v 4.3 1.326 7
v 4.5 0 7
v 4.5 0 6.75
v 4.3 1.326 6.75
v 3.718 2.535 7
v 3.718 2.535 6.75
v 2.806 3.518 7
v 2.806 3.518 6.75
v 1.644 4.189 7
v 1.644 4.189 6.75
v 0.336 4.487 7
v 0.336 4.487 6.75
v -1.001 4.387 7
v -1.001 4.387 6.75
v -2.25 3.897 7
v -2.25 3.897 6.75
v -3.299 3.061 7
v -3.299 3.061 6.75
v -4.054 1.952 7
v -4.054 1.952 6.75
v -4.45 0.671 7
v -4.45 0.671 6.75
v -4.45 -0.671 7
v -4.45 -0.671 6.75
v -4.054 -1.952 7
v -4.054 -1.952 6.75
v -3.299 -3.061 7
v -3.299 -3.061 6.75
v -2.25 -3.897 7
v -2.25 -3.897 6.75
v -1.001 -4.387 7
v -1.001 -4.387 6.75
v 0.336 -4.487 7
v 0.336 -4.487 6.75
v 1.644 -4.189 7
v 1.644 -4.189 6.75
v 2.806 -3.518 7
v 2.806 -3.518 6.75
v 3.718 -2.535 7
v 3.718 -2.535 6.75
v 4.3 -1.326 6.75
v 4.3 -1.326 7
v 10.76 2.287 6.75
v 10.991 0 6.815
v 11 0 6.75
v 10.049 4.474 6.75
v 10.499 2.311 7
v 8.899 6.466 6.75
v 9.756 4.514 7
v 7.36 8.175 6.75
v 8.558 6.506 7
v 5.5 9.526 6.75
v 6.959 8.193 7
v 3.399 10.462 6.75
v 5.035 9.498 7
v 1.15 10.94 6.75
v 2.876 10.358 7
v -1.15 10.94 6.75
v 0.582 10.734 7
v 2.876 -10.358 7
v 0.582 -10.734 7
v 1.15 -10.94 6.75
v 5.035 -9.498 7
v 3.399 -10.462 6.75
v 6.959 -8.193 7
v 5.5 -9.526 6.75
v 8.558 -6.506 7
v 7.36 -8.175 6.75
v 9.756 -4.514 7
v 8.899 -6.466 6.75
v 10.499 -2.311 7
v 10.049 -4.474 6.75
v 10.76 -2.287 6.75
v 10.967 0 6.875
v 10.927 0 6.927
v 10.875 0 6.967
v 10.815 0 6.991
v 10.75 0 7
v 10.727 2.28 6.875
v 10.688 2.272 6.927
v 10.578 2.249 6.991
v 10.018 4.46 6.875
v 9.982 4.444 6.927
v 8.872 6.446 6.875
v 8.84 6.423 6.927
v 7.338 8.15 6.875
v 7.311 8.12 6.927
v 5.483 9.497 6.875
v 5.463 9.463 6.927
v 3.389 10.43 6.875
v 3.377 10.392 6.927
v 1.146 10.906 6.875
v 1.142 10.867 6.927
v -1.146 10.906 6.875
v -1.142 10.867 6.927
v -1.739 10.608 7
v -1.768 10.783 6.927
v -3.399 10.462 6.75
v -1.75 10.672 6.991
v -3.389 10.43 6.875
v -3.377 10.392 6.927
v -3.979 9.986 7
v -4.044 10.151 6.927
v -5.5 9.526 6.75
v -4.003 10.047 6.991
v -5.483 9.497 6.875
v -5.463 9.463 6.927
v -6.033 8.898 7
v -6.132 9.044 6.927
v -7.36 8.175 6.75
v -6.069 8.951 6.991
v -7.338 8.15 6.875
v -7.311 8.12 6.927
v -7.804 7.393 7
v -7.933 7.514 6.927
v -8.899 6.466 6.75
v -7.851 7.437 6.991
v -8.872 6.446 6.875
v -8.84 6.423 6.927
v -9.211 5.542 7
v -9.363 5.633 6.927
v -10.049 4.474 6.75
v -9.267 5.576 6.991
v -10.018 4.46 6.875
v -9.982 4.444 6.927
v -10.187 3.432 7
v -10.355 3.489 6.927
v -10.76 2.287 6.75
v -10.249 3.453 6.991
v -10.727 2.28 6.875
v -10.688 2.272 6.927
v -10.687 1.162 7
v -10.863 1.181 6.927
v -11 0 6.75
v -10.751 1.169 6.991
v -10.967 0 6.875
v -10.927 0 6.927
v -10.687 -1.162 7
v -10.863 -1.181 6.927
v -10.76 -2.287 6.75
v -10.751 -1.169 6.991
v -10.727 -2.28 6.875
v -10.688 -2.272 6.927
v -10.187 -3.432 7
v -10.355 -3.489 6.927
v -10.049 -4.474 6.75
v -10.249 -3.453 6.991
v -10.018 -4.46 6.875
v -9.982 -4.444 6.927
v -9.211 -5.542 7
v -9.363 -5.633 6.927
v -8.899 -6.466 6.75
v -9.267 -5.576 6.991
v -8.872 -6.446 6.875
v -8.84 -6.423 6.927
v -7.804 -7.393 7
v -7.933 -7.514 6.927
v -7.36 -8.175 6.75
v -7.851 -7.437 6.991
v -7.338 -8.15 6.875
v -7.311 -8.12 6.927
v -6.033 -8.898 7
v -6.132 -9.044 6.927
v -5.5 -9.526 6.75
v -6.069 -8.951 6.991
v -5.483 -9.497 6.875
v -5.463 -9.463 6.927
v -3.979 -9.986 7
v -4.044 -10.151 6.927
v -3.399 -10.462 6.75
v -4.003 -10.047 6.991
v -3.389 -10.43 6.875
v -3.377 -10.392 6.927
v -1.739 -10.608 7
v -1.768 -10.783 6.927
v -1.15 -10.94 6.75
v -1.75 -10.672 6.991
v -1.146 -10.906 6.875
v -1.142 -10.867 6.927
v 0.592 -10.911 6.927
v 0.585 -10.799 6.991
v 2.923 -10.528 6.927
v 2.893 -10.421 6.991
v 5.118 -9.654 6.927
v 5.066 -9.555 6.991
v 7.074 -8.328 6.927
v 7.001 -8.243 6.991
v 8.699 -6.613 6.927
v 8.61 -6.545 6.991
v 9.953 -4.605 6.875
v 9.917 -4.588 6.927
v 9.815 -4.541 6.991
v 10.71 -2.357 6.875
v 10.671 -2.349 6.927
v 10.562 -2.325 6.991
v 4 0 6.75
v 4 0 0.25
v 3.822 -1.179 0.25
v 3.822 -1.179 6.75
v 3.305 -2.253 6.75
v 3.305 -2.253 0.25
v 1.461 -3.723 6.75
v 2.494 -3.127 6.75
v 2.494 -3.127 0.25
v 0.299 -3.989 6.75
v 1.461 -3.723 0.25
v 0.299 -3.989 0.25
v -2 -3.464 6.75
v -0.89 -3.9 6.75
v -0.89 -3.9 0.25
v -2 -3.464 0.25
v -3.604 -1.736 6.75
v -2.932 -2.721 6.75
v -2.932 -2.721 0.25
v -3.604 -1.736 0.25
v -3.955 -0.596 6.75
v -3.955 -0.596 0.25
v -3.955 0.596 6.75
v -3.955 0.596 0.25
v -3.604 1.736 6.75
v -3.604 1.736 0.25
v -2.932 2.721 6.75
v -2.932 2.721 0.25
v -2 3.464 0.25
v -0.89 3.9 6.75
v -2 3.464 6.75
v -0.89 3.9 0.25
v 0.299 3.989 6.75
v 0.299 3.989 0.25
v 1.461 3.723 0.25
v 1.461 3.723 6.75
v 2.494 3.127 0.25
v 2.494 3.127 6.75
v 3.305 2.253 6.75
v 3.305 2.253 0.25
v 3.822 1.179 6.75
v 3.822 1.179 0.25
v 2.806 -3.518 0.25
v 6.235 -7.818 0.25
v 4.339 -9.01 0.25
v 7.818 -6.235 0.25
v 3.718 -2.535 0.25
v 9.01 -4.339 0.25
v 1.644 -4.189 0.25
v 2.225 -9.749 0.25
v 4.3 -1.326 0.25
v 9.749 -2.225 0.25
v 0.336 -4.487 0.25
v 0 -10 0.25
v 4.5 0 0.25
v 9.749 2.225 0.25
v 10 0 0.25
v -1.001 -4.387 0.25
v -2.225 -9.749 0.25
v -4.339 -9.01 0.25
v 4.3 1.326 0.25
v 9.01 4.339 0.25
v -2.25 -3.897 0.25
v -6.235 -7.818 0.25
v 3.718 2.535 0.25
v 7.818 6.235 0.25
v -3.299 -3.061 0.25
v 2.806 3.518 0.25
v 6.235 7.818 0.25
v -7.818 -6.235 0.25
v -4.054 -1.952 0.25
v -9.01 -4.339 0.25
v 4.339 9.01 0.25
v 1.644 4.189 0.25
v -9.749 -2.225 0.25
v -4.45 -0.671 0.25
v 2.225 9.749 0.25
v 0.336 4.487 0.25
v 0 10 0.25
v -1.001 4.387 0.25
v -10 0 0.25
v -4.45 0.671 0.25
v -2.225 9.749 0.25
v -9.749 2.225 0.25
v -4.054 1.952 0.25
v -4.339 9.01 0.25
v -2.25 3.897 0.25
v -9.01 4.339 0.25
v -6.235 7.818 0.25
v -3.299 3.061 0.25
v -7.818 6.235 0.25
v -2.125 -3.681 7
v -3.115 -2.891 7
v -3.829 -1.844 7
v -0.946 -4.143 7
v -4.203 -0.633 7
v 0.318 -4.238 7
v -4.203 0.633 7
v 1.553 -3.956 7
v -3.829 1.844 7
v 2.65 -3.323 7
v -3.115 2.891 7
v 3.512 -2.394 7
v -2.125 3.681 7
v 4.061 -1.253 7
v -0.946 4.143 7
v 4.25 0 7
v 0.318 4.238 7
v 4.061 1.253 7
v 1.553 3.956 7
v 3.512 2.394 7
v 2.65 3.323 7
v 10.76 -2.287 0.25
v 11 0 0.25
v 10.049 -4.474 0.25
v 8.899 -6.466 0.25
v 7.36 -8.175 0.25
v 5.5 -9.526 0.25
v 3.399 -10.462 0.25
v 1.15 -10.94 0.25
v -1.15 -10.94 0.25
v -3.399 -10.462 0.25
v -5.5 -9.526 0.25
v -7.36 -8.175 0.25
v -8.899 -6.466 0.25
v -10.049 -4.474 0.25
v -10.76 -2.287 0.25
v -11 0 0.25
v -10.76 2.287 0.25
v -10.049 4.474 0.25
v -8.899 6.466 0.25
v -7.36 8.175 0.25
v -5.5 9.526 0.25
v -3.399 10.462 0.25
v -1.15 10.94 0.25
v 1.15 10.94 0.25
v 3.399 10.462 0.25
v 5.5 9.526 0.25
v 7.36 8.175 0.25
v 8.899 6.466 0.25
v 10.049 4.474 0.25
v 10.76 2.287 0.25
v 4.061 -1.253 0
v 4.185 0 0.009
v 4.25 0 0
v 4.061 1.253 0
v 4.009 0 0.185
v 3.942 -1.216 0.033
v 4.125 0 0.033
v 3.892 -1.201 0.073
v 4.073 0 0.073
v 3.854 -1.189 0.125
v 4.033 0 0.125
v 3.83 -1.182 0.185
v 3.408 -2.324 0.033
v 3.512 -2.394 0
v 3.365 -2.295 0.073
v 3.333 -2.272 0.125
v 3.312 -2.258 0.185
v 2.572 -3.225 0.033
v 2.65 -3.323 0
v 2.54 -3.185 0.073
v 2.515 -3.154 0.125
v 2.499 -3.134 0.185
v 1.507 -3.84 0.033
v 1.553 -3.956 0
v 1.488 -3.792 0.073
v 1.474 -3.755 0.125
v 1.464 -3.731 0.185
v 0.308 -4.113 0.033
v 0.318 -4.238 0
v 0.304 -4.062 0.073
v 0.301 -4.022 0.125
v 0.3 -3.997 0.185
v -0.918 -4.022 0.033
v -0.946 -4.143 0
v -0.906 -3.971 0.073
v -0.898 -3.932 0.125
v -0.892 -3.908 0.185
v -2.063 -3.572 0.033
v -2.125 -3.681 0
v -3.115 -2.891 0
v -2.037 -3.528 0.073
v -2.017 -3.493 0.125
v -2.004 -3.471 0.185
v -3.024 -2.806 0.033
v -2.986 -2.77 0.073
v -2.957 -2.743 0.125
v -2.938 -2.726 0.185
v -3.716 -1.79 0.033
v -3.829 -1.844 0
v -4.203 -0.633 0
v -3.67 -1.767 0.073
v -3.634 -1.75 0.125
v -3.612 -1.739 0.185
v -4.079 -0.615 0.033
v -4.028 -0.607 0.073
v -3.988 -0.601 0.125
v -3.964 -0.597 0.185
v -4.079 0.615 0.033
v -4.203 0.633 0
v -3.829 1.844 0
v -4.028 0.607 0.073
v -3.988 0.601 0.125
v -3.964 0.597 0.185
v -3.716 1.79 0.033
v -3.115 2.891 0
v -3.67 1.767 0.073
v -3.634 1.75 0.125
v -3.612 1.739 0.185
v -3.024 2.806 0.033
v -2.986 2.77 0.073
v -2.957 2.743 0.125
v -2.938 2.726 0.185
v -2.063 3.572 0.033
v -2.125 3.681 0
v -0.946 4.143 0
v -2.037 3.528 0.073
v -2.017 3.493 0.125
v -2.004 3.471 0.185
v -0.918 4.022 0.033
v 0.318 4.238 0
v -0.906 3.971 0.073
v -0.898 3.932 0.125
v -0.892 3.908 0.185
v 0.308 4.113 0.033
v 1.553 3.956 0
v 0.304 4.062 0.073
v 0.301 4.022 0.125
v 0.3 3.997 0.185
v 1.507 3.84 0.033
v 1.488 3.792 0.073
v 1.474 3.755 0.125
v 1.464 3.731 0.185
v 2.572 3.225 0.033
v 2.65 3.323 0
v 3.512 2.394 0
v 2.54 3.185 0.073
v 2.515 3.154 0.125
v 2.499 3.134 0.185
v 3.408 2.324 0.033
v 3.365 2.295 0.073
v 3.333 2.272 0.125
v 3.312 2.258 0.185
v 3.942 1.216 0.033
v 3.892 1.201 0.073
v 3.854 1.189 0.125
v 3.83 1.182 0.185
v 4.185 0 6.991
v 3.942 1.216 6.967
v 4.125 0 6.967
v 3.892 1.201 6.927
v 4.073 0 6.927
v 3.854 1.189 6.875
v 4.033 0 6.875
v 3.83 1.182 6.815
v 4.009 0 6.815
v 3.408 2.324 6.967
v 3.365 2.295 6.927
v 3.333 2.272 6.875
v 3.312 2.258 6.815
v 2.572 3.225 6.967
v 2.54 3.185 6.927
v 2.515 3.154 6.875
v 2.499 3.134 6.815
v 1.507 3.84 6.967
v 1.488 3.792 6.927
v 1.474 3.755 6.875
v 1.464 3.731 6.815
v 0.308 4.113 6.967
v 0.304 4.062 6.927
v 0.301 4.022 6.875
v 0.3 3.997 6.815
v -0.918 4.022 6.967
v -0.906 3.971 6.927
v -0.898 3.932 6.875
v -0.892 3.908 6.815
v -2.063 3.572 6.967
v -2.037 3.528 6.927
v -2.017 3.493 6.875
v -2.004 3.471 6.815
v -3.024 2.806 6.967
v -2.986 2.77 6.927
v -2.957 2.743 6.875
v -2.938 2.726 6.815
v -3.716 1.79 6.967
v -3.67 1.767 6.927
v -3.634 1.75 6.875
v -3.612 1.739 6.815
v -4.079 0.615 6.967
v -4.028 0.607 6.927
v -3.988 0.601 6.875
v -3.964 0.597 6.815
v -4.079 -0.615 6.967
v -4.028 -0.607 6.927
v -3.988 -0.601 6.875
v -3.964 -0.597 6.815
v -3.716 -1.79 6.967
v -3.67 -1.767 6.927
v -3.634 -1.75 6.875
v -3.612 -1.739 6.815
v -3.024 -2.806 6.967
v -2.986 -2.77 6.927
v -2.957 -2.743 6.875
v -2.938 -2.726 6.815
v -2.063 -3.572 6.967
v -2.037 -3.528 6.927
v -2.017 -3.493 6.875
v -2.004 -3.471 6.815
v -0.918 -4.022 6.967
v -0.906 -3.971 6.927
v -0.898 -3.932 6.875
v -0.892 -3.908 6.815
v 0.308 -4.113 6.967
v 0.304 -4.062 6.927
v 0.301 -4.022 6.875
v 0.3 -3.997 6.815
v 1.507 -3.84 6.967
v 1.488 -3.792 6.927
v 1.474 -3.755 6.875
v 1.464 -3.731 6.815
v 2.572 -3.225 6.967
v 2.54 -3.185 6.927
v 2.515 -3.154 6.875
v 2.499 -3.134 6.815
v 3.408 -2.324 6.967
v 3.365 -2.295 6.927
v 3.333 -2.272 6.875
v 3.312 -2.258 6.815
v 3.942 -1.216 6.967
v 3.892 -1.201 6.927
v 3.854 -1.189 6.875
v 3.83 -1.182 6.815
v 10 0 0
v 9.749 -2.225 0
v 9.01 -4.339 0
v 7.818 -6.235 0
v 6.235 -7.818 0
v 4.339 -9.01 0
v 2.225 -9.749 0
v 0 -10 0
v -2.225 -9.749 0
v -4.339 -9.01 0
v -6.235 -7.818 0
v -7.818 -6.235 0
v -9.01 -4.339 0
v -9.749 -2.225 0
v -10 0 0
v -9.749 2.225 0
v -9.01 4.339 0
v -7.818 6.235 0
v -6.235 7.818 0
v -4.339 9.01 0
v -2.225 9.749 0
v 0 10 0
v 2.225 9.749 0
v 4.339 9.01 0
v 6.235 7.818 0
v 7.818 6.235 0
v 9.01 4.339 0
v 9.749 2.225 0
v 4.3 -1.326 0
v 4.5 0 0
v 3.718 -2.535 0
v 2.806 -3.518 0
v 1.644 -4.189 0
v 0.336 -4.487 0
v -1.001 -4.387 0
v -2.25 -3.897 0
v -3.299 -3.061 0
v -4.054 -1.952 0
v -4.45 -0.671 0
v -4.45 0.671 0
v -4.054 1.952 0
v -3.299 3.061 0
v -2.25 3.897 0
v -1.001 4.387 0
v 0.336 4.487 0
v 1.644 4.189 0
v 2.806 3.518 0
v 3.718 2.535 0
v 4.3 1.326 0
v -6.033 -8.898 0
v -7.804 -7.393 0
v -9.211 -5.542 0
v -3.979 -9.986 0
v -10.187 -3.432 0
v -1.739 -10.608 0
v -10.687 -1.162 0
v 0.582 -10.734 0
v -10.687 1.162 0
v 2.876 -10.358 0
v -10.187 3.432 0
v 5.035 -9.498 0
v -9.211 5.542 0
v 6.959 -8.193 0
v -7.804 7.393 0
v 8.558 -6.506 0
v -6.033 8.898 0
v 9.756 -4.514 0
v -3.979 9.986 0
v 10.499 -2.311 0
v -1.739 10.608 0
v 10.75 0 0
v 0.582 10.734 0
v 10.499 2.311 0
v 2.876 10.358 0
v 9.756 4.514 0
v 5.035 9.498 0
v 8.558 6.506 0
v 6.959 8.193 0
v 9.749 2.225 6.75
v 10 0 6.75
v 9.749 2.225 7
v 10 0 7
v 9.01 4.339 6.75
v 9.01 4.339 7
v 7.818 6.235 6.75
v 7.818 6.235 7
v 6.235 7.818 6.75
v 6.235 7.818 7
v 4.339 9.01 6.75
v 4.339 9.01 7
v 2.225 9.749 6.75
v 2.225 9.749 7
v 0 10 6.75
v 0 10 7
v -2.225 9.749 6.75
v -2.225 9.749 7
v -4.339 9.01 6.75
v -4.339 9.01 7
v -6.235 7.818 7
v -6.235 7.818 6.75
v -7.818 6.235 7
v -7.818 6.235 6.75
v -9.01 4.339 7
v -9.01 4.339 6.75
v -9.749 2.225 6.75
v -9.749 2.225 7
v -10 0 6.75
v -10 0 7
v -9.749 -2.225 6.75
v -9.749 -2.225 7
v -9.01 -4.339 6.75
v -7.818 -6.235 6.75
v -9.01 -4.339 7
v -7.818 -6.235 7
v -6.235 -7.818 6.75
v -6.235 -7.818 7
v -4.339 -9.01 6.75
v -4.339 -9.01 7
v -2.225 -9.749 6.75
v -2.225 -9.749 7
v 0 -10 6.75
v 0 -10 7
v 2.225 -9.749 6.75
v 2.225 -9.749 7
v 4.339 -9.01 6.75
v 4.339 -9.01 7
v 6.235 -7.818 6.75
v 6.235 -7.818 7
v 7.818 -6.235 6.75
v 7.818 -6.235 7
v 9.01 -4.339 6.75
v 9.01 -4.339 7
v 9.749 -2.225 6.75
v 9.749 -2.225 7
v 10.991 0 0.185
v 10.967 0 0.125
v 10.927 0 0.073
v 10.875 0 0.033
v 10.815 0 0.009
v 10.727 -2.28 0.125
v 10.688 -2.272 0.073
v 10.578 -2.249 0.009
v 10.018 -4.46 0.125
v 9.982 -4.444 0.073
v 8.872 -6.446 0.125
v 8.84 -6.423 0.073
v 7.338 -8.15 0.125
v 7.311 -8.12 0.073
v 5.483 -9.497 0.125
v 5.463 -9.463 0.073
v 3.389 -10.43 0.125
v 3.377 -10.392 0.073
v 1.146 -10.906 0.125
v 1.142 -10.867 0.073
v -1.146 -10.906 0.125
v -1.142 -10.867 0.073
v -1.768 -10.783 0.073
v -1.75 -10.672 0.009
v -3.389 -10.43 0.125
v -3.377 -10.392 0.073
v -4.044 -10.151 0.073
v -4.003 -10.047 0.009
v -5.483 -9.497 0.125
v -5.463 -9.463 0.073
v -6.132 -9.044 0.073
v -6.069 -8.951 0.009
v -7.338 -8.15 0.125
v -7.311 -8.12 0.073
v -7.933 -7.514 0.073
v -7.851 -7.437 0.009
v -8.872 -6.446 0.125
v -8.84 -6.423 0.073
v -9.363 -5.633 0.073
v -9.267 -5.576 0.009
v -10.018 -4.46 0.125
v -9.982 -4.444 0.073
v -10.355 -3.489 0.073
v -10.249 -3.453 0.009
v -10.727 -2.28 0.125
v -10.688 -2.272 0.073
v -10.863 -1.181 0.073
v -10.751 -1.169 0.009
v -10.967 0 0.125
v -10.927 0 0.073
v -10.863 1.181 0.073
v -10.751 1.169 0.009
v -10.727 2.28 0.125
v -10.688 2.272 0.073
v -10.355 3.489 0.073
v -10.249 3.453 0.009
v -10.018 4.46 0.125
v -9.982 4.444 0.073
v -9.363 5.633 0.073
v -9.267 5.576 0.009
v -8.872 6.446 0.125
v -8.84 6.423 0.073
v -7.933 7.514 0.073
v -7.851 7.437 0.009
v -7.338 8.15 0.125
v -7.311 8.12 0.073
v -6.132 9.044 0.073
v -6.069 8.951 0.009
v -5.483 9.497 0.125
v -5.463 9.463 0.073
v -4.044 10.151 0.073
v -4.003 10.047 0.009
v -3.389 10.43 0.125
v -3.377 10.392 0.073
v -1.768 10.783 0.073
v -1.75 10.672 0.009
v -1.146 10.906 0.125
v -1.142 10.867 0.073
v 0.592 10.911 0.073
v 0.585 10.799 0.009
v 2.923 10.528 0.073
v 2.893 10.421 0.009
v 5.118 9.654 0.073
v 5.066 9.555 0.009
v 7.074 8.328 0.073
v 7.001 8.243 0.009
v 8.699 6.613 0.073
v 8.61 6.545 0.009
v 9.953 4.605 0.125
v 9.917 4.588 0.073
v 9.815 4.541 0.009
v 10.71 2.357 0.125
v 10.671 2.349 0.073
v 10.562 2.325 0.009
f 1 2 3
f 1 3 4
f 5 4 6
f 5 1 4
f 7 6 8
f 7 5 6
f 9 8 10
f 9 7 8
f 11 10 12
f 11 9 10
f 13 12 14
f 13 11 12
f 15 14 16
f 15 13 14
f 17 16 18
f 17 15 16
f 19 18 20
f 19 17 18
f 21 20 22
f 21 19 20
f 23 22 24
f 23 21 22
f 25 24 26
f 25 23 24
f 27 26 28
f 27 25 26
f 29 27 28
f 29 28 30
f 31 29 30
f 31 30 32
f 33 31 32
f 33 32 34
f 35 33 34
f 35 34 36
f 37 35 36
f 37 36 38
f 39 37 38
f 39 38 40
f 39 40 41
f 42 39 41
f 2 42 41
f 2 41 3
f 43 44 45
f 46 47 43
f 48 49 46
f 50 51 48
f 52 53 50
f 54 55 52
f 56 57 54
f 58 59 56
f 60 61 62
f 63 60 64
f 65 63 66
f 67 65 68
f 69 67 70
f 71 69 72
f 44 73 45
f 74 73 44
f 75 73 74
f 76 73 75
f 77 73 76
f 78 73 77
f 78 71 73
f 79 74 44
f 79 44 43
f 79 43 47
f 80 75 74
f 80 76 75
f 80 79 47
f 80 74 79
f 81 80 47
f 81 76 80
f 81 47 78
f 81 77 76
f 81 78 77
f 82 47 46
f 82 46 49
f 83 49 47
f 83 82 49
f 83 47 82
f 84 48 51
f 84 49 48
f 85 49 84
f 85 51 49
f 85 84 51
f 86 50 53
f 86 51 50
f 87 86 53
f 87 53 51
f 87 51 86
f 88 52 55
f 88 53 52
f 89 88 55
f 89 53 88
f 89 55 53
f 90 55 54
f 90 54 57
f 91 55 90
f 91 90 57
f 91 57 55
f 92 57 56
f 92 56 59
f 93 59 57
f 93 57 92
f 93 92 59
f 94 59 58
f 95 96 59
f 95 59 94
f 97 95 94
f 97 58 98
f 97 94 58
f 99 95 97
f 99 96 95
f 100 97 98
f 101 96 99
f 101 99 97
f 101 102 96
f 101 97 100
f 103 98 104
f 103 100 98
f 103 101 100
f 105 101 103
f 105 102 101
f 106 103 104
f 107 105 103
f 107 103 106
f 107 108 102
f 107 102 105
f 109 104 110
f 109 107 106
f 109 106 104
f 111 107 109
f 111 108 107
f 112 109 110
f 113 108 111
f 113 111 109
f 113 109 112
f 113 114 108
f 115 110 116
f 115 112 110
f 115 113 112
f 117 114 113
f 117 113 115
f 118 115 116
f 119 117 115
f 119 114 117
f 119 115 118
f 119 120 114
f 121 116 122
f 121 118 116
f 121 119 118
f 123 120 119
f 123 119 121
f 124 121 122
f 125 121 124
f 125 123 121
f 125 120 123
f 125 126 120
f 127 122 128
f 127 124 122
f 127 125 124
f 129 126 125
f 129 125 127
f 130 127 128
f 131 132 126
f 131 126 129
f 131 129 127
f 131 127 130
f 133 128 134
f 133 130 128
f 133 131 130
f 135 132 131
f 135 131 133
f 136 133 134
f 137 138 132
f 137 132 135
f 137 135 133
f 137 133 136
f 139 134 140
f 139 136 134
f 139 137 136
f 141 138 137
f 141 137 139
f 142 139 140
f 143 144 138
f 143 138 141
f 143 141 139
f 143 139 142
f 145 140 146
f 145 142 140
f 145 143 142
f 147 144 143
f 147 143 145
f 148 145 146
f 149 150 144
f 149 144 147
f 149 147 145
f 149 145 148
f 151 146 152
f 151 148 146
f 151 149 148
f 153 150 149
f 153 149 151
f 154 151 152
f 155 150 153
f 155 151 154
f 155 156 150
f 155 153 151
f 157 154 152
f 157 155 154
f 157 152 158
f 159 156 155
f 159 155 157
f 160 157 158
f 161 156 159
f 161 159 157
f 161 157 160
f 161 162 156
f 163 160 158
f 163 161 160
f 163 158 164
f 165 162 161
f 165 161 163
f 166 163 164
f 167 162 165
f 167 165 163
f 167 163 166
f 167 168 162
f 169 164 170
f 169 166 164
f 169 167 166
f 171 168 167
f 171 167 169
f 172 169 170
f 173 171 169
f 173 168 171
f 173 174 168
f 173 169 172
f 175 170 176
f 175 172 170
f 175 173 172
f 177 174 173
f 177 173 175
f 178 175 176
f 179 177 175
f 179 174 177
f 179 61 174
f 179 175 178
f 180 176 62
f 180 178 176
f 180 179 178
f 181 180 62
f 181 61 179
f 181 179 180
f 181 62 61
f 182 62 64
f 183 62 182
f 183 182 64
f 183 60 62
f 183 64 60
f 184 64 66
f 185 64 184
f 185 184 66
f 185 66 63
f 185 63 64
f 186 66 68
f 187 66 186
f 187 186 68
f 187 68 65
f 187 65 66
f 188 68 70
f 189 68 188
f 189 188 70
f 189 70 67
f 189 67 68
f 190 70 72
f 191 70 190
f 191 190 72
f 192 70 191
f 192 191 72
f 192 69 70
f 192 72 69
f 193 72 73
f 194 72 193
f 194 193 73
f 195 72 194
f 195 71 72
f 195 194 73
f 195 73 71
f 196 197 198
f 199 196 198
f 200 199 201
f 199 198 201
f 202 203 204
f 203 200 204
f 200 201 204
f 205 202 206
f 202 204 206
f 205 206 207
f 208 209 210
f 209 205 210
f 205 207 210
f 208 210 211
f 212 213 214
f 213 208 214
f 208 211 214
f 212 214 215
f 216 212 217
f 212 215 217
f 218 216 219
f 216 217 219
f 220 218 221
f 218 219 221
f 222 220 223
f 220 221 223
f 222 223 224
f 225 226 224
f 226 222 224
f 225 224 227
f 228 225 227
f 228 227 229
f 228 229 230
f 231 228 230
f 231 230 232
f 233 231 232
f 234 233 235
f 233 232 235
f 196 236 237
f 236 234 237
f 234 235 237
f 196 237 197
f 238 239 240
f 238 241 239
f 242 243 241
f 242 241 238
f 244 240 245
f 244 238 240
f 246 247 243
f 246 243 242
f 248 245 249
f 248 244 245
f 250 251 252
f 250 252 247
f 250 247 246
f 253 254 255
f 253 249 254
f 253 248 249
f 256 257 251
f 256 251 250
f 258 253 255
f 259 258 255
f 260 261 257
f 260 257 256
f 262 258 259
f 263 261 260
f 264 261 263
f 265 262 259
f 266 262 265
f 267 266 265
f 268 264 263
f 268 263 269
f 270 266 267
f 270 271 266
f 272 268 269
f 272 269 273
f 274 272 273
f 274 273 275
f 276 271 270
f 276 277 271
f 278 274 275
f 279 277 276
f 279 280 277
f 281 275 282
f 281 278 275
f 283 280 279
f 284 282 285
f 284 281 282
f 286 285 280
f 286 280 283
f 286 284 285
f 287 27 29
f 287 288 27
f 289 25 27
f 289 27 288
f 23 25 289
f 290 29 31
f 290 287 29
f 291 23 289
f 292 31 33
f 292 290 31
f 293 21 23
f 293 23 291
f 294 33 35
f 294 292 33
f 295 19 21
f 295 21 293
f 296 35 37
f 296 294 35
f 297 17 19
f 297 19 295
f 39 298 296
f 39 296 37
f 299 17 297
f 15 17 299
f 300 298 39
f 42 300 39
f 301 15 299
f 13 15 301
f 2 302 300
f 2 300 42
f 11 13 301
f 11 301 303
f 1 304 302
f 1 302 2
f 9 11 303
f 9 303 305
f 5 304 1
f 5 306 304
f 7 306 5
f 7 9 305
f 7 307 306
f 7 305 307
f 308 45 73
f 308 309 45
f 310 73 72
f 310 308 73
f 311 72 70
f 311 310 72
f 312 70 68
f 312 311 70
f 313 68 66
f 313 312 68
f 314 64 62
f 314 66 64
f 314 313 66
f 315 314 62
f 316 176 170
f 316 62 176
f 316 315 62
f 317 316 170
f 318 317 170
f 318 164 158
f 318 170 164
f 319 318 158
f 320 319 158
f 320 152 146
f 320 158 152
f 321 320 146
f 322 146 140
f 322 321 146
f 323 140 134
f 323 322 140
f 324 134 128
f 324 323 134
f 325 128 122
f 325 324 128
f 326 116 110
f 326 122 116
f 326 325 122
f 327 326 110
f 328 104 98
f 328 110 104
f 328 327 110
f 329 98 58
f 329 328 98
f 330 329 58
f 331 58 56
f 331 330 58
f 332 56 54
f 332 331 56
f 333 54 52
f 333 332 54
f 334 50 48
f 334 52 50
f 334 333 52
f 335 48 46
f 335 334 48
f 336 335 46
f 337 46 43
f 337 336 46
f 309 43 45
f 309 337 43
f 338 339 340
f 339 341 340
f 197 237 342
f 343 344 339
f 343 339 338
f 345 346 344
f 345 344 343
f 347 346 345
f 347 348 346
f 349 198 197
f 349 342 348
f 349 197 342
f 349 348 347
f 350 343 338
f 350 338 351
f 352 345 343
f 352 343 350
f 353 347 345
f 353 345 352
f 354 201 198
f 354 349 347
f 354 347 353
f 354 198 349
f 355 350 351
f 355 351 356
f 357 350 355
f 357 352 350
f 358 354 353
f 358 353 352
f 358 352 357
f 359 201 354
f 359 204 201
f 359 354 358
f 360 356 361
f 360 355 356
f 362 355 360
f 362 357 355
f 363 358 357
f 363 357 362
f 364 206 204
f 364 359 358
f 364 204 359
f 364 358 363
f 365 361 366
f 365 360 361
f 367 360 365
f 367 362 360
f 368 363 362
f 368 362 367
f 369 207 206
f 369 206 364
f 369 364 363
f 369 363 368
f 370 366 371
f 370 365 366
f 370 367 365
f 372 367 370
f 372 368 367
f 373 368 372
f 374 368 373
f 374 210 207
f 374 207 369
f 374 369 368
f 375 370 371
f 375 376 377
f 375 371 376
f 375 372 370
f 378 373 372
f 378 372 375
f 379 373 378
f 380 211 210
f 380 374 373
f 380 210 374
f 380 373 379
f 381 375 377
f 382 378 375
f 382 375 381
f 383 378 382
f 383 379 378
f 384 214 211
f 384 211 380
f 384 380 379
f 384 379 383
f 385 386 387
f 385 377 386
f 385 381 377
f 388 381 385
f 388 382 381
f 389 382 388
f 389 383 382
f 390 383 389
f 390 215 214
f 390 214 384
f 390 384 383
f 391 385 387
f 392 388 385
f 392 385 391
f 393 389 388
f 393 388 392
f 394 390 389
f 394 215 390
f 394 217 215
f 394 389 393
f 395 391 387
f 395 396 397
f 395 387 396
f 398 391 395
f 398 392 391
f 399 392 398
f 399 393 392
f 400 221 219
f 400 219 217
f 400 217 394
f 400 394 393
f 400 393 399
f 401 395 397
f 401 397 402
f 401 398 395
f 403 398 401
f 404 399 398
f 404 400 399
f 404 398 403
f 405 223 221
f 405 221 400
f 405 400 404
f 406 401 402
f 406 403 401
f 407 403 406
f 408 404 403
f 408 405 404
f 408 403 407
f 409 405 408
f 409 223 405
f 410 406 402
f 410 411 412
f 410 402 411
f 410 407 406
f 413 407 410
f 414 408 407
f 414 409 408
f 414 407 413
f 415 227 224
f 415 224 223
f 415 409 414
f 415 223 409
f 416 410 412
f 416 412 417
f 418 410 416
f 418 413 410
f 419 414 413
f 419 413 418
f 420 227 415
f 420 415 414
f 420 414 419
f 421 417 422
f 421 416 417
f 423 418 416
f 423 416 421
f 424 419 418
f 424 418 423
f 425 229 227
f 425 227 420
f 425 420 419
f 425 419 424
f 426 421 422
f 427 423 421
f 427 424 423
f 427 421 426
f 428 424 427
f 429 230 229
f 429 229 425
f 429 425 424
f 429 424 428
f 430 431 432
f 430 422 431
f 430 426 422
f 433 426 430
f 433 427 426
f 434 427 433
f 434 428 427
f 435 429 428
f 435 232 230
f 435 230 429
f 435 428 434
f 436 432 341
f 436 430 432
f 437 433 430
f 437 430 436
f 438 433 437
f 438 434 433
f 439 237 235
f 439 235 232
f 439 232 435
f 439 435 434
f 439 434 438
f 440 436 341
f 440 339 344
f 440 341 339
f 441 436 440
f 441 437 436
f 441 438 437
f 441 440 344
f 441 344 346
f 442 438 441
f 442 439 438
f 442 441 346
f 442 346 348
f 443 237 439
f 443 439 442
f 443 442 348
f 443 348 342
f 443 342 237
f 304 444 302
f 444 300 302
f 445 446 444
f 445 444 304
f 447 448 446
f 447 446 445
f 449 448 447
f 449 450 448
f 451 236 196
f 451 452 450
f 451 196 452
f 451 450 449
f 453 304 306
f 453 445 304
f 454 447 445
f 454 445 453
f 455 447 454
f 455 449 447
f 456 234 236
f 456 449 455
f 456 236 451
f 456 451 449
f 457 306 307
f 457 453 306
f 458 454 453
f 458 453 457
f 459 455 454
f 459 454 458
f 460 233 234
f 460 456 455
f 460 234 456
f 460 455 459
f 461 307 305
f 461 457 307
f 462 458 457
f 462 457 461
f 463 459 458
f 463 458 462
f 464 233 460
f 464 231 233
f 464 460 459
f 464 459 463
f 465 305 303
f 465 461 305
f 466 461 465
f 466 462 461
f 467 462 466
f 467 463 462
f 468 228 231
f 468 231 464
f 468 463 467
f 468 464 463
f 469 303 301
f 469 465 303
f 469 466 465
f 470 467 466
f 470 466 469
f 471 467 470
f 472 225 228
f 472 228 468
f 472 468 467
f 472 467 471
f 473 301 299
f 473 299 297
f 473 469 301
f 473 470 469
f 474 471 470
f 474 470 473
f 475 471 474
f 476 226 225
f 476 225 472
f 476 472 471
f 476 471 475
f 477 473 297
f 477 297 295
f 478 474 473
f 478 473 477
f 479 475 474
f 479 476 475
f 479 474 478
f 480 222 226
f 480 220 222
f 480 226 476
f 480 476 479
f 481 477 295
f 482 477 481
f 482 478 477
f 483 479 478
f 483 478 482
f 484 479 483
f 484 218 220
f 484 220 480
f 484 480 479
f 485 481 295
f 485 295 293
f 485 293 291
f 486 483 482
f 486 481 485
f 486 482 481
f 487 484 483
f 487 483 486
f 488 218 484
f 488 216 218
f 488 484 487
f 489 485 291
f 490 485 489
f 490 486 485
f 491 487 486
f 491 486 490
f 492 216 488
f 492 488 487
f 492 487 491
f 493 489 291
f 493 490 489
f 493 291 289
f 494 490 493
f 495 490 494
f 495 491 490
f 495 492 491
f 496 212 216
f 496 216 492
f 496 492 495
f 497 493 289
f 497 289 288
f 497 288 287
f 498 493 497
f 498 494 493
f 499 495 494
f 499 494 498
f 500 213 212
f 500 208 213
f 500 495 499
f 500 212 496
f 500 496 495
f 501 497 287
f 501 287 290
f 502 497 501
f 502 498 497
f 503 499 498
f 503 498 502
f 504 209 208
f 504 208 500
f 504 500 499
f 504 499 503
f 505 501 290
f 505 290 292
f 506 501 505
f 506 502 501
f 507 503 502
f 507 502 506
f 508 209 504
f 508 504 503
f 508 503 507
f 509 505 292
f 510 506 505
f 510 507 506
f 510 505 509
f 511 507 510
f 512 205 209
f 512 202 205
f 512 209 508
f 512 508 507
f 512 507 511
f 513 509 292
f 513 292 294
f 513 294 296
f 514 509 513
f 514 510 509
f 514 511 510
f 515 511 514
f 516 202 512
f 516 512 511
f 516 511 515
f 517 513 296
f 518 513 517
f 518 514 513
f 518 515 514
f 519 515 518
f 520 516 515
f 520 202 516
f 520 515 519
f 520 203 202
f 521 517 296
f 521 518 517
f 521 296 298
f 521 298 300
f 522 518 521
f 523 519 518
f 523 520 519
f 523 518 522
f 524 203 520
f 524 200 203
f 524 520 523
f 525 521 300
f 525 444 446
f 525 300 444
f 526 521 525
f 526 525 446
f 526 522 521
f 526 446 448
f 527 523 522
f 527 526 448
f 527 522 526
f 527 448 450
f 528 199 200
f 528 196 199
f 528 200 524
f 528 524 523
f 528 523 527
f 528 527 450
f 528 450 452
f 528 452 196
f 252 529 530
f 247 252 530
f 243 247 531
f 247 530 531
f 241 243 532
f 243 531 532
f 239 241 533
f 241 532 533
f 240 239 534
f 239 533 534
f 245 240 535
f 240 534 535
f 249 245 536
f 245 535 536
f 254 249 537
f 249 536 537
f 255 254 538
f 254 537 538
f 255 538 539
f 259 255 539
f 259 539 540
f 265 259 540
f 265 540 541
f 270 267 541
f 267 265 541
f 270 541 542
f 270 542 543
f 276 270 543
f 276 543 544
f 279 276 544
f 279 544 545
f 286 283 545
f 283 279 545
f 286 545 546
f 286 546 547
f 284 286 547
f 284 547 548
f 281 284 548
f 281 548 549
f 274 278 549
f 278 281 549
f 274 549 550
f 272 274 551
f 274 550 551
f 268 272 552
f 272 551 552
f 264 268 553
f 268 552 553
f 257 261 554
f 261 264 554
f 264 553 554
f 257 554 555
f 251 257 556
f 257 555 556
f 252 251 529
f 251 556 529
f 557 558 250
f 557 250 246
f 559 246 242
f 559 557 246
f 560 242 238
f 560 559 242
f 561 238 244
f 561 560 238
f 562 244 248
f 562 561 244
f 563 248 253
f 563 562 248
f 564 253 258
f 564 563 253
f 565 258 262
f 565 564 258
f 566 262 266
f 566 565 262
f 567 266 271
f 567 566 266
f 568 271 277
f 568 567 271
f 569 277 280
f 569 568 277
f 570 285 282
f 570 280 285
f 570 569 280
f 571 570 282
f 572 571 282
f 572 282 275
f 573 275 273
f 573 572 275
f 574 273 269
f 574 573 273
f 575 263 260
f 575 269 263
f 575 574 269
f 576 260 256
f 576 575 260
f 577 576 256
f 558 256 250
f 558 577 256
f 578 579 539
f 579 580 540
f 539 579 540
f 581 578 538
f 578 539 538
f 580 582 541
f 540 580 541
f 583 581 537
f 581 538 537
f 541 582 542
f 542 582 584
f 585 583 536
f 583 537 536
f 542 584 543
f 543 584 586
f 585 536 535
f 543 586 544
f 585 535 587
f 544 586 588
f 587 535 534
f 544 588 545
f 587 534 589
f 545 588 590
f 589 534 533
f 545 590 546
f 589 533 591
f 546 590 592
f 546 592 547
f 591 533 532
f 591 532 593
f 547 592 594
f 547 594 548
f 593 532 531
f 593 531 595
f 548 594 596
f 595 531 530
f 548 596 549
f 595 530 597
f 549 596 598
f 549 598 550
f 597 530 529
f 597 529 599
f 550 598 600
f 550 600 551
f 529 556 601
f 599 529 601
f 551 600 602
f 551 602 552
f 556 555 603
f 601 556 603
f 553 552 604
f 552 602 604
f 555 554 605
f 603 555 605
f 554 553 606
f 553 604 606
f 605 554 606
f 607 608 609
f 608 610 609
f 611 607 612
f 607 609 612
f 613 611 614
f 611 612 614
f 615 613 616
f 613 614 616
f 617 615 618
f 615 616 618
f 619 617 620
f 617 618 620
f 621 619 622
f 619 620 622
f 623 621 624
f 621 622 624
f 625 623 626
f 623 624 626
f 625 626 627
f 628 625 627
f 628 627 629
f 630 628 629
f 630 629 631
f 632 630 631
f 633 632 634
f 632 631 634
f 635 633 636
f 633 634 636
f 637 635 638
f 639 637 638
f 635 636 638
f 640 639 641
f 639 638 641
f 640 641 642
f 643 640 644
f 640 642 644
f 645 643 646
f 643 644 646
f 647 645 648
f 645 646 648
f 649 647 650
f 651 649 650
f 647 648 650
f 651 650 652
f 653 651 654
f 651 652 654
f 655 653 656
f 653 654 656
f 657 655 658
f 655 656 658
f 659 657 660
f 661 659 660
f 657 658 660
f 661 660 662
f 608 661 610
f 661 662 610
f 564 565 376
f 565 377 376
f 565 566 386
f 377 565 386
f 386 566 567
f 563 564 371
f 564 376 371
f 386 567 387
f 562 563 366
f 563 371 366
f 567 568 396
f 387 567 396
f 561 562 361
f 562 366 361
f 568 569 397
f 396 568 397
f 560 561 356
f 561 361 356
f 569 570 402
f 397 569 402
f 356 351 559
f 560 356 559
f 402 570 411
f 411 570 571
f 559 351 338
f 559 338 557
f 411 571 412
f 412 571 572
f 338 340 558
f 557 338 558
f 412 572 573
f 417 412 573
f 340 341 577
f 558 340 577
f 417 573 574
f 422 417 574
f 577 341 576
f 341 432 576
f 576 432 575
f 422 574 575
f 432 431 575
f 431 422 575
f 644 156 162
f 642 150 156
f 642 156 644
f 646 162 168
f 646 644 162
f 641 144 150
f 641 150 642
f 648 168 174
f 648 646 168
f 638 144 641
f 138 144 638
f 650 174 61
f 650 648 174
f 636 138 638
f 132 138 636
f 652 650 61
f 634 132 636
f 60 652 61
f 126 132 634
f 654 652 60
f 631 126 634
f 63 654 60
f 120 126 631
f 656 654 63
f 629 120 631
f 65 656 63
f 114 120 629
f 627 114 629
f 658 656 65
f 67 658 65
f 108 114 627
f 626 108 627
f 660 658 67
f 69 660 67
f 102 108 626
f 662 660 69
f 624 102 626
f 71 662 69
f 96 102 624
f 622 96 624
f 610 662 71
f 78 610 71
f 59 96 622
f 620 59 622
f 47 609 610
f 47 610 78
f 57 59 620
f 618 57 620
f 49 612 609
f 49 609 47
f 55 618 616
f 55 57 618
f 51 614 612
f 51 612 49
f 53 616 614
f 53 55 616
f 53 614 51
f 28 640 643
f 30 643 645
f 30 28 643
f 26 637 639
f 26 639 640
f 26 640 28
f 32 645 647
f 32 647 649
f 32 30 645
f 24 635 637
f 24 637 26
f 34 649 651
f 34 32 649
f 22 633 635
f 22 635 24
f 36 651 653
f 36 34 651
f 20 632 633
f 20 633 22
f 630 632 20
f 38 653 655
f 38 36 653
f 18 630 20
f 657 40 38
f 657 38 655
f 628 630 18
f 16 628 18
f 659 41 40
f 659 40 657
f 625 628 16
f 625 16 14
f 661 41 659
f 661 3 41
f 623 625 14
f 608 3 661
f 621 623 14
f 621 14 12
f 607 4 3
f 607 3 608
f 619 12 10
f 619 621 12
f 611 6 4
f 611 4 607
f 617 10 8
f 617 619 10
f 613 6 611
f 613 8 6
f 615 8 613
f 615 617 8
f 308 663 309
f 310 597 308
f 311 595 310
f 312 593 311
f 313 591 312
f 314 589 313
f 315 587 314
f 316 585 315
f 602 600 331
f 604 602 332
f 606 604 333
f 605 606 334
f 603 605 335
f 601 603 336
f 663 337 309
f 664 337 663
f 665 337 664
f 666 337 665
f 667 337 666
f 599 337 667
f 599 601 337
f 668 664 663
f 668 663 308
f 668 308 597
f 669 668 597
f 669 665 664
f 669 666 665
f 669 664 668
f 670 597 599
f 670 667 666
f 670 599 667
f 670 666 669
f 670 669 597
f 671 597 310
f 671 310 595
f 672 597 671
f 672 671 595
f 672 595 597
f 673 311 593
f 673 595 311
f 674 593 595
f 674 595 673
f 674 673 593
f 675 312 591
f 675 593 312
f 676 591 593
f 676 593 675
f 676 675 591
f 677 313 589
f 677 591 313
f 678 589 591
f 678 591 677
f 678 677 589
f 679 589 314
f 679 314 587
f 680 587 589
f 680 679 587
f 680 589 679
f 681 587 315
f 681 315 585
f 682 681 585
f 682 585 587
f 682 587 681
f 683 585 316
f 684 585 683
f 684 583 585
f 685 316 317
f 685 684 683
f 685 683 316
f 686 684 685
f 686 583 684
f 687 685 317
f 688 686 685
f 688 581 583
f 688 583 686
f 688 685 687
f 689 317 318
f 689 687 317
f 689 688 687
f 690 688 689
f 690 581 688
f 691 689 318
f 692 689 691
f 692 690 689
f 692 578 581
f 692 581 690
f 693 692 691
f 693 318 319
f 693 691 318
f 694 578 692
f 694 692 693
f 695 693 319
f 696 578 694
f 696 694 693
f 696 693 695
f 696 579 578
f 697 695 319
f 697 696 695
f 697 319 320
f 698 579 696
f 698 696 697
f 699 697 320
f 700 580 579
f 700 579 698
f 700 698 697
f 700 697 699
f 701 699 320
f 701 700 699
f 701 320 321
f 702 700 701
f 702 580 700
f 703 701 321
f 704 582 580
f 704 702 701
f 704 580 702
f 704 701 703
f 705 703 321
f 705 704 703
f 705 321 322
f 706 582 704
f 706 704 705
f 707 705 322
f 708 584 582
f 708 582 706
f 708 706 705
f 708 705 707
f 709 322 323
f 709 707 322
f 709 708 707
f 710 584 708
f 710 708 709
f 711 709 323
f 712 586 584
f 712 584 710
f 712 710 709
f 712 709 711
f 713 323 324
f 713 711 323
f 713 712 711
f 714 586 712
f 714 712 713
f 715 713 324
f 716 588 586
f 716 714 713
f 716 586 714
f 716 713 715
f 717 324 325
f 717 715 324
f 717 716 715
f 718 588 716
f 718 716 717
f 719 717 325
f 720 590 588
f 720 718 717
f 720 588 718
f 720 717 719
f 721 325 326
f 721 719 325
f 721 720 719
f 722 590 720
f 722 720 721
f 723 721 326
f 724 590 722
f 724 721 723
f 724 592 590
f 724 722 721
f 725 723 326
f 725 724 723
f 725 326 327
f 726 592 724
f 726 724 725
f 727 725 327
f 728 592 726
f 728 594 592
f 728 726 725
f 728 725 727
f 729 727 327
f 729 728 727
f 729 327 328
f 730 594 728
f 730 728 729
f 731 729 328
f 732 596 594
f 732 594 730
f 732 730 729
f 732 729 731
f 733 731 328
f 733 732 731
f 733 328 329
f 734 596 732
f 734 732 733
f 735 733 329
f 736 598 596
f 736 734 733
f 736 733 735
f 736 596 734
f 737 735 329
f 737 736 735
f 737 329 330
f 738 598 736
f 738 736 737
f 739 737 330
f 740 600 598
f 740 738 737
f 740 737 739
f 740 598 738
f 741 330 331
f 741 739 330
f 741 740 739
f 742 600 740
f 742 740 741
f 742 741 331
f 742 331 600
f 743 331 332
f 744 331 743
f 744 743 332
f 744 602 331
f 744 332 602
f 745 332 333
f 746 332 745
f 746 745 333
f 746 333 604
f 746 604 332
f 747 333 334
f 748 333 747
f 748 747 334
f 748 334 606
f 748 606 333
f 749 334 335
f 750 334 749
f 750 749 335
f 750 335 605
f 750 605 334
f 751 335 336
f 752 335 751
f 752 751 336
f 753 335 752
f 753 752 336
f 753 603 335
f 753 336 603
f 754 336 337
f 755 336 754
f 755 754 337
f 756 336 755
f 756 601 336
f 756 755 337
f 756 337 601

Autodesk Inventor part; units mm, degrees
ref_plane "YZ Plane" through (0, 0, 0) normal (1, 0, 0) x (0, 1, 0)
ref_plane "XZ Plane" through (0, 0, 0) normal (0, 1, 0) x (-1, 0, 0)
sketch "Sketch1" plane through (0, 0, 0) normal (0, 0, 1) x (1, 0, 0)
  circle A0 centre (0, 0) radius 4
  circle A1 centre (0, 0) radius 11
  dimension "d0" = 8
  dimension "d1" = 22
extrude "Extrusion1" add sketch "Sketch1" along normal blind 7
sketch "Sketch2" plane through (0, 0, 7) normal (0, 0, 1) x (1, 0, 0)
  circle A0 centre (0, 0) radius 4.5
  circle A1 centre (0, 0) radius 10
  dimension "d4" = 9
  dimension "d5" = 20
extrude "Extrusion2" cut sketch "Sketch2" against normal blind 0.25
ref_plane "Work Plane1" through (0, 0, 3.5) normal (0, 0, 1) x (1, 0, 0)
mirror "Mirror1" about plane through (0, 0, 3.5) normal (0, 0, 1) of "Extrusion2"
fillet "Fillet1" radius 0.25 4 edges at (-11, 0, 7) (-11, 0, 0) (-4, 0, 0) (-4, 0, 7)
properties part number "Ball bearing"
